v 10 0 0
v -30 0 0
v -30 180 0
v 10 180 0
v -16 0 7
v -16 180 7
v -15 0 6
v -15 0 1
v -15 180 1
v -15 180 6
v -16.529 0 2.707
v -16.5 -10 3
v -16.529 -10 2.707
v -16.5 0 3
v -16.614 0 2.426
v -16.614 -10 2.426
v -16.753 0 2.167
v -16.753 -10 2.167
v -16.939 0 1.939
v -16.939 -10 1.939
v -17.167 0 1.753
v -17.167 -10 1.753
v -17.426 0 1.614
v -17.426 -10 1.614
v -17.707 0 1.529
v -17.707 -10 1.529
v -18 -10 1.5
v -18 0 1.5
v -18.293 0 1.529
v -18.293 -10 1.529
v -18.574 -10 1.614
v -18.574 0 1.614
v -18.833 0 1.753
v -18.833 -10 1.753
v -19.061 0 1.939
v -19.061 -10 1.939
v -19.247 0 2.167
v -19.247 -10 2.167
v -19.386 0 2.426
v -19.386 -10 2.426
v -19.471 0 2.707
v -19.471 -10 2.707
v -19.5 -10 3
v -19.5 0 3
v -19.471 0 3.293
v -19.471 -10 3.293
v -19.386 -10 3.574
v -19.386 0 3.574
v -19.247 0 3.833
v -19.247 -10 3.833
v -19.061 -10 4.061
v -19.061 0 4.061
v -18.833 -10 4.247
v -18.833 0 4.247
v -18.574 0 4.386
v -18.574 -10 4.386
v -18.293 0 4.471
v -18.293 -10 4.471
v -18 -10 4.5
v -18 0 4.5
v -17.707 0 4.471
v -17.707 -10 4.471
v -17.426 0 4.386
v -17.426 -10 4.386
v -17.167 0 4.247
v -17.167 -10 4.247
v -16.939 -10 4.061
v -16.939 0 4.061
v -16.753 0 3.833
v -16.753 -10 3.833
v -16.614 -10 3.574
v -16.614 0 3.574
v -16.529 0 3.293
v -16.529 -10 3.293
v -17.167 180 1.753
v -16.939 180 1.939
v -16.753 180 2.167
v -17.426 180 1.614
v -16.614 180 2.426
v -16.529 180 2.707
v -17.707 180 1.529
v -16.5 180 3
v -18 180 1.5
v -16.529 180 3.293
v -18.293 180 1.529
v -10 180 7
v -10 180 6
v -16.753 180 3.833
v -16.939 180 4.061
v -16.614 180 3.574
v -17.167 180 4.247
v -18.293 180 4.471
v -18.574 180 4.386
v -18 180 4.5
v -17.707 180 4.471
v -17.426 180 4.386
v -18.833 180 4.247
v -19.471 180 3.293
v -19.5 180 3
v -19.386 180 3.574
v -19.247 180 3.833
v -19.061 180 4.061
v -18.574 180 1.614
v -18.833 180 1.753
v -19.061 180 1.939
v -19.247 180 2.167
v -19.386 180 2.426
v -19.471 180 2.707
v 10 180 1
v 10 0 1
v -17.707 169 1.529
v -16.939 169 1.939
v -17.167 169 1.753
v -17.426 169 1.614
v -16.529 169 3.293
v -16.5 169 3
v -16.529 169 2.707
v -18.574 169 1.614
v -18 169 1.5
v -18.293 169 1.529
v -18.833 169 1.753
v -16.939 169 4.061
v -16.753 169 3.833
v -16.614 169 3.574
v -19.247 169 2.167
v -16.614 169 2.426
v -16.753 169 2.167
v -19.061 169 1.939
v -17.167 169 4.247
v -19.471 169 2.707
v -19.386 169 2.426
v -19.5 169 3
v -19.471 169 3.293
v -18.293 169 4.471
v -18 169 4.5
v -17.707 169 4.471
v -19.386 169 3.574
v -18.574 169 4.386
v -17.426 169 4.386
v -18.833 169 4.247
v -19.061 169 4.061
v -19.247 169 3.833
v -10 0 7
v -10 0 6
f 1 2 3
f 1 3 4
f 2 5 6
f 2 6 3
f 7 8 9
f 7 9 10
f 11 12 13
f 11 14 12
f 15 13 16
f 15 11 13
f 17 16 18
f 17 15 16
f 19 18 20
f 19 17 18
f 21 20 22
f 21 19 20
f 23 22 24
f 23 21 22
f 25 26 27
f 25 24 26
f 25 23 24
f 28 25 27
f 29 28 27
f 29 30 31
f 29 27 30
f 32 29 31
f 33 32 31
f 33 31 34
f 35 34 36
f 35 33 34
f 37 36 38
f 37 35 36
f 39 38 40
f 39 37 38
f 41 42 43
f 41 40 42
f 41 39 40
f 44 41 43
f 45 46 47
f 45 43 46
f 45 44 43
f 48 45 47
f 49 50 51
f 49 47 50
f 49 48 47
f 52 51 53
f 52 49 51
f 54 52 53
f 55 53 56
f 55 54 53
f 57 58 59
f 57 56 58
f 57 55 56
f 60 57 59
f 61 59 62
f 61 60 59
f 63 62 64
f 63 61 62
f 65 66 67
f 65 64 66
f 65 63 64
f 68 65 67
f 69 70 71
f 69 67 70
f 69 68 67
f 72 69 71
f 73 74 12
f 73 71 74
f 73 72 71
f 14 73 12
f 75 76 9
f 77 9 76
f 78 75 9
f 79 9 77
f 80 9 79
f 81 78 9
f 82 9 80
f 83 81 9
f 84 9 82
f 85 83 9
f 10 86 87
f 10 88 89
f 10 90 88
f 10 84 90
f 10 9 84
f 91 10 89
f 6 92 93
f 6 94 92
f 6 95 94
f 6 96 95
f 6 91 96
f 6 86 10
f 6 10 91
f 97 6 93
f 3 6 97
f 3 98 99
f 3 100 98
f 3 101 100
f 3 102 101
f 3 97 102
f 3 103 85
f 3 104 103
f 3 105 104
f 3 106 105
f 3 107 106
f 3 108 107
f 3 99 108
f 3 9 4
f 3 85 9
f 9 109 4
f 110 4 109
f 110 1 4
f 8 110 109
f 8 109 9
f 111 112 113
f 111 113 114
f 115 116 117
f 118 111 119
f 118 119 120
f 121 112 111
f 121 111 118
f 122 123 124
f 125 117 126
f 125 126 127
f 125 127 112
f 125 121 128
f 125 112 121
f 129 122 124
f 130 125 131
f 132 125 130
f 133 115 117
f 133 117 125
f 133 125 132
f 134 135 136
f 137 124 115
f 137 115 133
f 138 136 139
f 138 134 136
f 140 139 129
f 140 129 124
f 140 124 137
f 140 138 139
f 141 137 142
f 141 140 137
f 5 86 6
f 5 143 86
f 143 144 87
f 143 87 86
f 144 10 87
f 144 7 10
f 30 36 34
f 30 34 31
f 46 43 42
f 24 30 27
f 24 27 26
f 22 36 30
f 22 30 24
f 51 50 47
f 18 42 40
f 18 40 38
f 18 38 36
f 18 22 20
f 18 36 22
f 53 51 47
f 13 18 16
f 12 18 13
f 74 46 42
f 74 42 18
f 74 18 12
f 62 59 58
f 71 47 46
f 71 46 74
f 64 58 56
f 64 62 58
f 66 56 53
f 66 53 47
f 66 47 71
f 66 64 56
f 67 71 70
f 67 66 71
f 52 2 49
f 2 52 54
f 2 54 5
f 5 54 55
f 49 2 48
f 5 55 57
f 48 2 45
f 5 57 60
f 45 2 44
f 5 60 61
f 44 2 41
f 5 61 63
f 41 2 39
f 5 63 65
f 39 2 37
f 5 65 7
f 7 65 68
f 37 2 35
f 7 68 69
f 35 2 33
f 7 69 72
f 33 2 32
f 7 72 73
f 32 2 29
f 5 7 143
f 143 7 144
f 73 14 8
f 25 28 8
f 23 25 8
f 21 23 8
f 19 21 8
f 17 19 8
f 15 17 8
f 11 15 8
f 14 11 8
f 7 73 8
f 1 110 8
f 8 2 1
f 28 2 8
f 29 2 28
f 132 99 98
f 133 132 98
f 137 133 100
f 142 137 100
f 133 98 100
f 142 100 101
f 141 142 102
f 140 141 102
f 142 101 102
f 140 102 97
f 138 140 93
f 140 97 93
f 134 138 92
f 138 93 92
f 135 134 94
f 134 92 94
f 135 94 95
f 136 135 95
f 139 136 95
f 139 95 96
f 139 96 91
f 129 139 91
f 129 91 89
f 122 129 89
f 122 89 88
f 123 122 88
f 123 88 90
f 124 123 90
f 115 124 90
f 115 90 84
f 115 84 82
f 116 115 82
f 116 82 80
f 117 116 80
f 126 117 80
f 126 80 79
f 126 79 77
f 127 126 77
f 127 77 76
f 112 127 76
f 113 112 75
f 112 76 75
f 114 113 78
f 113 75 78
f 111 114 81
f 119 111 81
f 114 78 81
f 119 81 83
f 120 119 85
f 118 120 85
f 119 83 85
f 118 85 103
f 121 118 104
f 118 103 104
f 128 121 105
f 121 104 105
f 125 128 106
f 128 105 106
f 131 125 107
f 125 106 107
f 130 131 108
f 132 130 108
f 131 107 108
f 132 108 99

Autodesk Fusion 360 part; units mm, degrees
sketch "Sketch1" plane through (0, 0, 0) normal (0, 1, 0) x (1, 0, 0)
  line L0 (-30, 0) -> (10, 0)
  line L1 (10, 0) -> (10, -1)
  line L2 (10, -1) -> (-15, -1)
  line L3 (-15, -1) -> (-15, -6)
  line L4 (-15, -6) -> (-10, -6)
  line L5 (-10, -6) -> (-10, -7)
  line L6 (-10, -7) -> (-16, -7)
  line L7 (-16, -7) -> (-30, 0)
  dimension "d1" = 40
  dimension "d2" = 1
sketch "Sketch2" plane through (0, 0, 0) normal (0, 1, 0) x (1, 0, 0)
extrude "Extrude1" add sketch "Sketch1" along normal blind 200
sketch "Sketch3" plane through (0, 0, 0) normal (0, -1, 0) x (1, 0, 0)
  line L0 (-10, 7) -> (-16, 7)
  line L1 (-16, 7) -> (-30, 0)
  line L2 (-30, 0) -> (10, 0)
  line L3 (10, 0) -> (10, 1)
  line L4 (10, 1) -> (-15, 1)
  line L5 (-15, 1) -> (-15, 6)
  line L6 (-15, 6) -> (-10, 6)
  line L7 (-10, 6) -> (-10, 7)
  circle A0 centre (-18, 3) radius 1.5
  dimension "d5" = 3
  dimension "d6" = 3
  dimension "d7" = 3
extrude "Extrude2" add sketch "Sketch3" along normal blind 10 contours A0
sketch "Sketch4" plane through (0, 0, 0) normal (0, 1, 0) x (1, 0, 0)
sketch "Sketch5" plane through (0, 200, 0) normal (0, 1, 0) x (-1, 0, 0)
  line L0 (16, 7) -> (10, 7)
  line L1 (10, 7) -> (10, 6)
  line L2 (10, 6) -> (15, 6)
  line L3 (15, 6) -> (15, 1)
  line L4 (15, 1) -> (-10, 1)
  line L5 (-10, 1) -> (-10, 0)
  line L6 (-10, 0) -> (30, 0)
  line L7 (30, 0) -> (16, 7)
  circle A0 centre (18, 3) radius 1.5
  dimension "d10" = 3
  dimension "d11" = 3
  dimension "d12" = 3
extrude "Extrude3" cut sketch "Sketch5" against normal blind 11 contours A0
sketch "Sketch6" plane through (0, 200, 0) normal (0, 1, 0) x (-1, 0, 0)
  line L0 (16, 7) -> (10, 7)
  line L1 (10, 7) -> (10, 6)
  line L2 (10, 6) -> (15, 6)
  line L3 (15, 6) -> (15, 1)
  line L4 (15, 1) -> (-10, 1)
  line L5 (-10, 1) -> (-10, 0)
  line L6 (-10, 0) -> (30, 0)
  line L7 (30, 0) -> (16, 7)
extrude "Extrude4" cut sketch "Sketch6" against normal blind 20
sketch "Sketch7" plane through (0, 0, 0) normal (0, 1, 0) x (1, 0, 0)
sketch "Sketch8" plane through (0, 180, 0) normal (0, 1, 0) x (-1, 0, 0)
  line L0 (30, 0) -> (16, 7)
  line L1 (16, 7) -> (10, 7)
  line L2 (10, 7) -> (10, 6)
  line L3 (10, 6) -> (15, 6)
  line L4 (15, 6) -> (15, 1)
  line L5 (15, 1) -> (-10, 1)
  line L6 (-10, 1) -> (-10, 0)
  line L7 (-10, 0) -> (30, 0)
  circle A0 centre (18, 3) radius 1.5
  dimension "d17" = 3
  dimension "d18" = 3
  dimension "d19" = 3
extrude "Extrude5" cut sketch "Sketch8" against normal blind 11 contours A0
